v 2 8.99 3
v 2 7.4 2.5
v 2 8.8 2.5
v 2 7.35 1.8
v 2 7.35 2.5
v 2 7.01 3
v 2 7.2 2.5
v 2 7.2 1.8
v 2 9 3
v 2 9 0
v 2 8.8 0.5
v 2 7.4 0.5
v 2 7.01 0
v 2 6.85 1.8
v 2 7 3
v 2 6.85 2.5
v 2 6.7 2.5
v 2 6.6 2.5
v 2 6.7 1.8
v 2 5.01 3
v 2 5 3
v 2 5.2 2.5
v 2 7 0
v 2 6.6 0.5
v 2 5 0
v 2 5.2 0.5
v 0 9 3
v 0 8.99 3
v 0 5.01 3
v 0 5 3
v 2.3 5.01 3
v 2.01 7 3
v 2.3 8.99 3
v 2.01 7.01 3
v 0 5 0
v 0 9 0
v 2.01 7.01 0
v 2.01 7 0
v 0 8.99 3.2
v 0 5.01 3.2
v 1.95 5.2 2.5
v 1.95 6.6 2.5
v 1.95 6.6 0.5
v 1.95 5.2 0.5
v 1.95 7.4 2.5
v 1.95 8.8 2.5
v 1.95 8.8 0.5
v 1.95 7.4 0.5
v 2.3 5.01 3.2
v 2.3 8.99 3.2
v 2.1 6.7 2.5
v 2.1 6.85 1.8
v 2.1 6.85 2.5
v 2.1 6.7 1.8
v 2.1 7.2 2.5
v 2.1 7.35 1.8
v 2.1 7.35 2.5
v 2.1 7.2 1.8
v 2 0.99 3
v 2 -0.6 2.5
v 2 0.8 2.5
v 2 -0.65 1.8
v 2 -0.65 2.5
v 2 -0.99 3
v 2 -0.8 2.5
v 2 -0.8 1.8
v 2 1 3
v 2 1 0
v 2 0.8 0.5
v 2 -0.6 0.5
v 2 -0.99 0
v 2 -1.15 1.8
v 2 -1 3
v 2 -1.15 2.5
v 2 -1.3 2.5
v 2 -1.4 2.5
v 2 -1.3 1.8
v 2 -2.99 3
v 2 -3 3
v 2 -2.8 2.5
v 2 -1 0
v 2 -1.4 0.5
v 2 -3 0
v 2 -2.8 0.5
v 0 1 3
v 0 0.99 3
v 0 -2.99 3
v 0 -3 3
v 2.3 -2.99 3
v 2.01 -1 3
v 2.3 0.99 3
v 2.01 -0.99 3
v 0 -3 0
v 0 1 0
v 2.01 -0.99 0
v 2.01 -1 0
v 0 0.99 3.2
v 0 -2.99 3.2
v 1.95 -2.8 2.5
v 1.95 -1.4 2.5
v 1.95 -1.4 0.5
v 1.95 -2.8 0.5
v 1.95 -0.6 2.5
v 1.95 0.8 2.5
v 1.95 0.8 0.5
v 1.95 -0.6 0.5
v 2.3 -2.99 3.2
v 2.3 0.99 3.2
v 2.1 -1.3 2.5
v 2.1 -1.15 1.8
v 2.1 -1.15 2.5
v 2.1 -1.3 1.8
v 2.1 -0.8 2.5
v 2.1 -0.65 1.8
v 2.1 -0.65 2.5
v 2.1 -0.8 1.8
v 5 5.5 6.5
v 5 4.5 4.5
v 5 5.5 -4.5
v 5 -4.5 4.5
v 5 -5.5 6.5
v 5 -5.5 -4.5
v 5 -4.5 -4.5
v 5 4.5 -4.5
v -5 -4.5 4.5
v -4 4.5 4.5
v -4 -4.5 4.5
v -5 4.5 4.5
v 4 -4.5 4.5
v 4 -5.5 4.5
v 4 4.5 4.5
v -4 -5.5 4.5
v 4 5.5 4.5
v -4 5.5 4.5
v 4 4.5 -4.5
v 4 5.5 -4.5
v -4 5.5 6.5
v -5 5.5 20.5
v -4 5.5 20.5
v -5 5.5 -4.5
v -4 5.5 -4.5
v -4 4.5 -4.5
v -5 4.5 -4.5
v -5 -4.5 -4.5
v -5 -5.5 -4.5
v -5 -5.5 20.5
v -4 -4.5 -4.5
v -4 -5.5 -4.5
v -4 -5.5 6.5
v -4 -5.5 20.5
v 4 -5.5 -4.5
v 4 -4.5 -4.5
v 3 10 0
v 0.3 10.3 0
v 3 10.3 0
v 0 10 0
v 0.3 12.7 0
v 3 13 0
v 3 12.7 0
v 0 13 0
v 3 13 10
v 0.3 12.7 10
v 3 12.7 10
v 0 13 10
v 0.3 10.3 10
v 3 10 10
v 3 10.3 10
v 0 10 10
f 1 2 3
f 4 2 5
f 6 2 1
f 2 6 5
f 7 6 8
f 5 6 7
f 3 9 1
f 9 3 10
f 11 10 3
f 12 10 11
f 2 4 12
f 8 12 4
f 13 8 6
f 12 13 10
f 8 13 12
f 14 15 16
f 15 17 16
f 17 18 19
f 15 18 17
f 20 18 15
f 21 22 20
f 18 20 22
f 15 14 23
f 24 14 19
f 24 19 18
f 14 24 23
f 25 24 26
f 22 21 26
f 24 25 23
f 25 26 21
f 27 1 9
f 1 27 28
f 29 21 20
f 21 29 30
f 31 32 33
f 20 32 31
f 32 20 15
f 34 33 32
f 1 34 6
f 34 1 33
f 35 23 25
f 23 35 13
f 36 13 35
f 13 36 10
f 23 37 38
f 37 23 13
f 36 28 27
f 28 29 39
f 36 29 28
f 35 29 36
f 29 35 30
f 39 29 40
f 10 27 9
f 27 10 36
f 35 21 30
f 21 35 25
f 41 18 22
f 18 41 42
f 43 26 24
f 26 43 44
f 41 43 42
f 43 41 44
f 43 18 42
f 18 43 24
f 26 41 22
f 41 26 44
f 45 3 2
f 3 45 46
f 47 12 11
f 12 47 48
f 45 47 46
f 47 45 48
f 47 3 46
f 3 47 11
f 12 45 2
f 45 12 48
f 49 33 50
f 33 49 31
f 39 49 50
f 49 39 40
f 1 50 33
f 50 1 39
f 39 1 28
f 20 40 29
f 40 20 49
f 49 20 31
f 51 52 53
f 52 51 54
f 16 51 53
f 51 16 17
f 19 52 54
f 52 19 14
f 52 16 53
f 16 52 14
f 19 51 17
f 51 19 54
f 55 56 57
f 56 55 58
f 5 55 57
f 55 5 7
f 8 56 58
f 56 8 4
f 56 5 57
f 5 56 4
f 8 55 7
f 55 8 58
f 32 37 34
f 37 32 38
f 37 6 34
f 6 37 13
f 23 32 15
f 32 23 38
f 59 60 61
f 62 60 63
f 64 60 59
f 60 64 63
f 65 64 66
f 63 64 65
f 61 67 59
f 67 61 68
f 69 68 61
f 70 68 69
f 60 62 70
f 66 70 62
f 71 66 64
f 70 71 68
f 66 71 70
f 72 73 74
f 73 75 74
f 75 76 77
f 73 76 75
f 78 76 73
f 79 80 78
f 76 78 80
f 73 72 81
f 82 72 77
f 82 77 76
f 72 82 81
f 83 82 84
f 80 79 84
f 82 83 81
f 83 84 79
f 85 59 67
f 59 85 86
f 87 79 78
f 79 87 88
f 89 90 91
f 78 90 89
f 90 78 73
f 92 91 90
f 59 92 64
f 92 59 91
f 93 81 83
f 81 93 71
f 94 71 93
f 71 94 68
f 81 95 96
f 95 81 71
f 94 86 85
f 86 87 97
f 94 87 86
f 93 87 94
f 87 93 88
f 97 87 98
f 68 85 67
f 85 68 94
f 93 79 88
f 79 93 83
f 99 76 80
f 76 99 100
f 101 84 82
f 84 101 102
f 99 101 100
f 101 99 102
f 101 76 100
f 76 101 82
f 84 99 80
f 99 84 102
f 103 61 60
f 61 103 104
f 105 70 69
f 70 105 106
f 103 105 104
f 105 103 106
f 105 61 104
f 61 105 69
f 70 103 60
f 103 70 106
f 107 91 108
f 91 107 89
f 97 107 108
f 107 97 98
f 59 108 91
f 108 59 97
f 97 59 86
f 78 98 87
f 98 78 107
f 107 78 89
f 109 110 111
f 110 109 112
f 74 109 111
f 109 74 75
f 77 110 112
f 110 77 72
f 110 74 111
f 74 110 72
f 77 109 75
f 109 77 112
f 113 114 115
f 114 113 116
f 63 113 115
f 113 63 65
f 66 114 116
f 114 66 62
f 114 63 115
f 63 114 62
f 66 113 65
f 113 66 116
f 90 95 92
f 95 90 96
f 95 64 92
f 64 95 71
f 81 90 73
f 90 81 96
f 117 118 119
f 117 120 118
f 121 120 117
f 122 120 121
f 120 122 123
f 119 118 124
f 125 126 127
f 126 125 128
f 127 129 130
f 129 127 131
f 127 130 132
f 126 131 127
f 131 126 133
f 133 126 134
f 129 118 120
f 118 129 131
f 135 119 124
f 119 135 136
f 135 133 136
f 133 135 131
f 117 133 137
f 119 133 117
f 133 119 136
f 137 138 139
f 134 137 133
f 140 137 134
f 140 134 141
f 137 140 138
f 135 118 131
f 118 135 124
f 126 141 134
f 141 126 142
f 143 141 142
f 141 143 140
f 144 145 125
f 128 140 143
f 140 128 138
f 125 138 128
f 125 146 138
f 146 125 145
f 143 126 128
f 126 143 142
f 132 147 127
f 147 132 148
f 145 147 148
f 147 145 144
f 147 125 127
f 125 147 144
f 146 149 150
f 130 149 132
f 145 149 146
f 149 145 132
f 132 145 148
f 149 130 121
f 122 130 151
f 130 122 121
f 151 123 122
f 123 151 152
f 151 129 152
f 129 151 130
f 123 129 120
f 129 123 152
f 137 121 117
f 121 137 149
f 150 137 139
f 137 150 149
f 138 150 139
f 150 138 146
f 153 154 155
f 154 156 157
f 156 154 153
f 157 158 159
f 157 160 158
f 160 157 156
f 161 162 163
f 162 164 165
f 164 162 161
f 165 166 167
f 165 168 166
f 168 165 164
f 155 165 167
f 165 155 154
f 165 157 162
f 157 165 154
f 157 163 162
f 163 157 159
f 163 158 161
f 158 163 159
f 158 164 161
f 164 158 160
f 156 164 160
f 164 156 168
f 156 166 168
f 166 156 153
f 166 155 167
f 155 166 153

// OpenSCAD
// file: Asset_SCAD/Flange.scad
module Flange(){
color("#c0c6c7")
difference(){
cylinder(10,100,100,$fn=30);

r = 80;
for (i=[0:90:359]) {
    translate([r*cos(i),r*sin(i),-1])
        cylinder(12,10,10,$fn=30);
 
 translate([0,0,-1]) 
 cylinder(12,50,50,$fn=50);   
}

}

}

Flange();
// file: Asset_SCAD/Fireplace.scad
module Fireplace(){   
    translate([0,0,0.1])
    color("gray")
    cube([20,10,0.4], center= true);


    difference(){

    translate([0,0,0.2+5])
    color("#b65454")
    cube([16,6,10], center= true);


    translate([0,-2,4])
    color("#842020")
    cube([14,5,8], center= true);

    }


    translate([0,-1,0.4])
    color("#786565")
    cube([15,3,0.5], center= true);


    translate([0,0,10.5])
    color("gray")
    cube([18,8,1], center= true);

    translate([0,0,11.5])
    color("black")
    cube([20,10,1], center= true);


    translate([0,0,11.5])
    color("#b65454")
    linear_extrude(height = 8, scale = 0.8) 
    square([9,7], center = true);


    translate([0,0,19.5])
    color("#b65454")
    linear_extrude(height = 15, scale = 1) 
    square([9 *0.8,7 *0.8], center = true);

}

Fireplace();
// file: Asset_SCAD/Fence_02.scad
module Fence_02(){

    module staccionata(){
    color("#da6d42")
    cube([1,1,10],center = true);
    }

    for (i=[-8:8])
       translate([i*5,0,0])
          staccionata();
          
    color("#da6d42"){     
    translate([0,0,-2])      
    cube([83,0.5,1],center = true);}

    color("#da6d42"){  
    translate([0,0,2])
    cube([83,0.5,1],center = rue);
    }

    color("#bd9476"){
    for (i=[-17:17])

       translate([i*2.4,0.5,1])
       cube([2,0.5,12],center = true);
    }
    
}


Fence_02();
 

          
         
// file: Asset_SCAD/Fence_01.scad
module Fence_01(){

module staccionata(){
cube([1,1,10],center = true);

      
translate([0.5,0.5,5])
rotate([90,-90,0])
linear_extrude(height=1){
polygon([[0,0],[0,1],[1,0.5]], paths=[[0,1,2]]);
}

}

for (i=[-8:8])
   translate([i*5,0,0])
      staccionata();
    
translate([0,0,-2])      
cube([80,0.5,1],center = true);

translate([0,0,2])
cube([80,0.5,1],center = true);

}

color("#e6e0d4"){
Fence_01();
}
// file: Asset_SCAD/Eyebolt.scad
module Eyebolt(){

    module pieno(){
        cube([60,10,60], center =true);

        translate([0,0,30])
        rotate([90,0,0])
        cylinder(10,30,30,$fn=30,center=true);
    }

    color("#a8b0b2")
    difference(){

    pieno();

    translate([0,0,30])
    rotate([90,0,0])
    cylinder(12,15,15,$fn=30,center=true);
    }

}

Eyebolt();
// file: Asset_SCAD/Electric_Wire_Plug.scad
color("white")
translate([0,-1,0])
cylinder(1,1,1, center= true, $fn = 30);

color("white")
cube([2,2,1], center= true);

color("gray")
translate([0,1.8,0])
rotate([90,0,0])
cylinder(1.6,0.15,0.15, center= true, $fn = 30);

color("gray")
translate([0,2.6,0])
sphere(0.15, $fn = 30);



color("gray")
translate([0.6,2,0])
rotate([90,0,0])
cylinder(1.2,0.15,0.15, center= true, $fn = 30);

color("gray")
translate([0.6,2.6,0])
sphere(0.15, $fn = 30);

color("black")
translate([0.6,1.5,0])
rotate([90,0,0])
cylinder(1,0.18,0.18, center= true, $fn = 30);

color("black")
translate([-0.6,1.5,0])
rotate([90,0,0])
cylinder(1,0.18,0.18, center= true, $fn = 30);

color("gray")
translate([-0.6,2,0])
rotate([90,0,0])
cylinder(1.2,0.15,0.15, center= true, $fn = 30);

color("gray")
translate([-0.6,2.6,0])
sphere(0.15, $fn = 30);

color("white")
translate([0,-2,0])
rotate([90,0,0])
cylinder(1,0.4,0.4, center= true, $fn = 30);
// file: Asset_SCAD/Door.scad
module Door(){
        difference(){
            color("#664433")
            cube([8,1,14], center = true );

            color("#553311")
            translate([2,-1,-4])
            color("#664433")
            cube([2.5,1.5,4], center = true );

            color("#553311")
            translate([-2,-1,-4])
            color("#664433")
            cube([2.5,1.5,4], center = true );

            color("#553311")
            translate([-2,-1,3])
            color("#664433")
            cube([2.5,1.5,4], center = true );
             
            color("#553311"){
            translate([2,-1,3])
            color("#664433")
            cube([2.5,1.5,4], center = true );
            }

        }

    color("#664433")
    translate([2,-0.3,-4])
    cube([2.3,0.5,3.6], center = true);

    color("#664433")
    translate([-2,-0.3,-4])
    cube([2.3,0.5,3.6], center = true);

    color("#664433")
    translate([2,-0.3,3])
    cube([2.3,0.5,3.6], center = true);

    color("#664433")
    translate([-2,-0.3,3])
    cube([2.3,0.5,3.6], center = true);

    color("#ada192")
    translate([2,-0.85,-0.5])
    color("#664433")
    cube([2,0.2,0.2], center = true );
    color("#ada192")
    translate([2.75,-0.5,-0.5])
    color("#664433")
    cube([0.5,0.5,0.5], center = true );

}


Door();
// file: Asset_SCAD/Circular_Blade.scad
module Circular_Blade(){
    union(){
    color("#a8b0b2")
    cylinder(5,16,16,$fn=30,center= true);


    for (i=[0:45:359]) {
        r = 15; // pattern radius
        n = 10; // number of cars
    step = 360/n;
    for (i=[0:step:359]) {
        angle = i;
        dx = r*cos(angle);
        dy = r*sin(angle);
        translate([dx,dy,0])
        rotate([0,0,angle])
       
        {
        
    color("#99a3a3")    
    linear_extrude(7, scale = 1, center = true)
    polygon(points=[[0,0],[5,0],[2,3.7],[-2,3.7],[-5,0]]);
         
    }    
    }
    }


    }
}

Circular_Blade();
// file: Asset_SCAD/Chalkboard_Support.scad
union(){
color("#c87d3a")
cube([2,0.1,1],center =true);

color("#424e63")
cube([1.8,0.102,0.8],center =true);


color("#c87d3a"){
translate([1,0,-0.5]){
cube([0.1,0.1,0.8],center =true);
}


color("#c87d3a"){
translate([-1,0,-0.5]){
cube([0.1,0.1,0.8],center =true);
}


color("#c87d3a"){
translate([-1,0,-0.9]){
cube([0.1,0.8,0.1],center =true);
}
}

color("#c87d3a"){
translate([1,0,-0.9]){
cube([0.1,0.8,0.1],center =true);
}
}



}
}

}
// file: Asset_SCAD/Chalkboard.scad
union(){

color("#c87d3a")
cube([2,0.1,1],center =true);

color("#424e63")
cube([1.8,0.102,0.8],center =true);


translate([0,0.1,-0.48])
color("#8b8f2b")
cube([2,0.1,0.02],center =true);

translate([-0.6,0.1,-0.45])
color("white")
cube([0.15,0.02,0.02],center =true);
}
// file: Asset_SCAD/Chair_02.scad
// Angelo Nicolì 2023 - Licensed GPL-2.0

// Modify Input DATA to change the shape of the chair


// INPUT DATA

Table_Leg = [1,1,9];      // lenght, width and height of legs
Table_Top_Height = 2;     //  Height of theSeat

Leg_Distance_x = 12;        
Leg_Distance_y = 14;     

seat_height = 6;         // Backpost size 
seat_width = 1;           // Backpost width (x axis)


// OUTPUT DATA

translate([Leg_Distance_x*0.5,Leg_Distance_y*0.5,0])
color("#82490b")
cube([Table_Leg[0],Table_Leg[1],Table_Leg[2]],center=true);

translate([-Leg_Distance_x*0.5,Leg_Distance_y*0.5,0])
color("#82490b")
cube([Table_Leg[0],Table_Leg[1],Table_Leg[2]],center=true);

translate([-Leg_Distance_x*0.5,-Leg_Distance_y*0.5,0])
color("#82490b")
cube([Table_Leg[0],Table_Leg[1],Table_Leg[2]],center=true);

translate([Leg_Distance_x*0.5,-Leg_Distance_y*0.5,0])
color("#82490b")
cube([Table_Leg[0],Table_Leg[1],Table_Leg[2]],center=true);

Table_Upper = [Leg_Distance_x + Table_Leg[0],Leg_Distance_y +Table_Leg[1],Table_Top_Height];

seat = [seat_width,Leg_Distance_y+Table_Leg[1],seat_height];

translate([0,0,Table_Leg[2]*0.5+Table_Top_Height*0.5])
color("#82490b")
cube([Table_Upper[0],Table_Upper[1],Table_Upper[2]],center=true);

translate([-Table_Upper[0]*0.5+seat[0]*0.5,0,Table_Leg[2]*0.5+Table_Top_Height+seat_height*0.5])
color("#82490b")
cube([seat[0],seat[1],seat[2]],center=true);

rotate([0,0,90])
translate([7,0,-2])
color("#82490b")
cube([1,12,1],center=true);


rotate([0,0,90])
translate([-7,0,-2])
color("#82490b")
cube([1,12,1],center=true);


rotate([0,0,0])
translate([-6,0,-2])
color("#82490b")
cube([1,14,1],center=true);

rotate([0,0,90])
translate([7,0,9])
color("#82490b")
cube([1,12,1],center=true);

rotate([90,0,0])
translate([6,7.5,-7])
color("#82490b")
cube([1,4,1],center=true);

rotate([0,0,90])
translate([-7,0,9])
color("#82490b")
cube([1,12,1],center=true);

rotate([90,0,0])
translate([6,7.5,7])
color("#82490b")
cube([1,4,1],center=true);


translate([0,0,7])
color("#F4FFFF")
cube([12,12.7,2],center=true);

translate([-4.3,0,13])
rotate([0,90,0])
color("#F4FFFF")
cube([12,12.5,2.5],center=true);
// file: Asset_SCAD/Chair_01.scad
// Angelo Nicolì 2023 - Licensed GPL-2.0

// Modify Input DATA to change the shape of the chair




module Chair_01(){
    // INPUT DATA

    Table_Leg = [1,1,9];      // lenght, width and height of legs
    Table_Top_Height = 2;     //  Height of theSeat

    Leg_Distance_x = 9;        
    Leg_Distance_y = 10;     

    seat_height = 14;         // Backpost size 
    seat_width = 1;           // Backpost width (x axis)


    // OUTPUT DATA

    translate([Leg_Distance_x*0.5,Leg_Distance_y*0.5,0])
    color("PowderBlue")
    cube([Table_Leg[0],Table_Leg[1],Table_Leg[2]],center=true);

    translate([-Leg_Distance_x*0.5,Leg_Distance_y*0.5,0])
    color("PowderBlue")
    cube([Table_Leg[0],Table_Leg[1],Table_Leg[2]],center=true);

    translate([-Leg_Distance_x*0.5,-Leg_Distance_y*0.5,0])
    color("PowderBlue")
    cube([Table_Leg[0],Table_Leg[1],Table_Leg[2]],center=true);

    translate([Leg_Distance_x*0.5,-Leg_Distance_y*0.5,0])
    color("PowderBlue")
    cube([Table_Leg[0],Table_Leg[1],Table_Leg[2]],center=true);

    Table_Upper = [Leg_Distance_x + Table_Leg[0],Leg_Distance_y +Table_Leg[1],Table_Top_Height];

    seat = [seat_width,Leg_Distance_y+Table_Leg[1],seat_height];

    translate([0,0,Table_Leg[2]*0.5+Table_Top_Height*0.5])
    color("PowderBlue")
    cube([Table_Upper[0],Table_Upper[1],Table_Upper[2]],center=true);

    translate([-Table_Upper[0]*0.5+seat[0]*0.5,0,Table_Leg[2]*0.5+Table_Top_Height+seat_height*0.5])
    color("YellowGreen")
    cube([seat[0],seat[1],seat[2]],center=true);

}

Chair_01();
// file: Asset_SCAD/Building_02.scad
module Building_02() {
 
    module door(door_size =[10,10,10] , coord =[0,0,0]){
      color("#a59f8b")
      translate([coord[0],coord[1],coord[2]])
      cube([door_size[0],door_size[1],door_size[2]], center= true);
    }
    
    
    union(){
    color("#132919")
    cube([10,10,10],center=true);
    
    
    translate([0,0,5.5])
    color("#d1c093")
    cube([10,10,0.1],center=true);
    
    // Doors
    color("#a59f8b")
    translate([0,-5,-4])
    cube([2,0.1,3],center=true);
    
    
    // Windows
    translate([3,-5,-3]){
    color("#9fcbd0")
    cube([2,0.1,2],center=true);
    }
    
    translate([3,-5,3]){
    color("#9fcbd0")
    cube([2,0.1,2],center=true);
    }
    
    translate([-3,-5,-3]){
    color("#9fcbd0")
    cube([2,0.1,2],center=true);
    }
    
    translate([-3,-5,3]){
    color("#9fcbd0")
    cube([2,0.1,2],center=true);
    }
     
    // Roof
    translate([0,0,5])
    color("#a59f8b")
    cube([12,12,1],center=true);
    
    translate([0,0,-5]){
    color("#a59f8b")
    cube([12,12,1],center=true);
    }
    
    translate([0,0,0]){
    color("#a59f8b")
    cube([12,12,1],center=true);
    }
    
    }
}

Building_02();
// file: Asset_SCAD/Building_01.scad
module Building_01(){

    union(){
        color("#132919")
        cube([10,10,20],center=true);

        translate([0,0,10.5])
        color("#a59f8b")
        cube([10.5,10.5,1],center=true);

        translate([0,0,11])
        color("#d1c093")
        cube([10,10,0.1],center=true);

        color("#a59f8b")
        translate([0,-5,-9])
        cube([2,0.1,2],center=true);

        translate([0,0,5])
        color("#9fcbd0")
        cube([11,11,4],center=true);

        translate([0,0,-5]){
        color("#9fcbd0")
        cube([11,11,4],center=true);
        }

        translate([0,0,0]){
        color("#9fcbd0")
        cube([11,11,4],center=true);
        }

    }

}

Building_01();
// file: Asset_SCAD/Bricks.scad
// get a single number


module Bricks(){
colors = ["#cb6b6b","#dd7d7d","#9e3333","#842020"];



single_rand = rands(5,10,1)[0];
single_rand2 = rands(5,10,1)[0];

index_color = rands(0,3,1)[0];

color(colors[index_color])
linear_extrude(height = 3){
square([single_rand,single_rand2]);
}


}


Bricks();

translate([10,0,0])
Bricks();
// file: Asset_SCAD/Bookshelf_02.scad
module Bookshelf_02(){

difference(){
color("#bd9476")
cube([10,20,20],center=true);

color("#d5b07c")
translate([2,0,0])
cube([8,16,17],center=true);



}

color("#4f200f")
translate([0.5,0,5])
cube([8,16,0.6],center=true);


color("#4f200f")
translate([0.5,0,-0])
cube([8,16,0.6],center=true);

color("#4f200f")
translate([0.5,0,-5])
cube([8,16,0.6],center=true);


color("#4f200f")
translate([0,0,10.5])
cube([12,21,1],center=true);
}

 Bookshelf_02();
// file: Asset_SCAD/Bookshelf_01.scad
module Bookshelf_01(){
    difference(){
        color("#664433")
        cube([10,10,20],center=true);

        color("#ada192"){
        translate([2,0,5])
        cube([8,8,4],center=true);

        translate([2,0,-5])
        cube([8,8,4],center=true);


        translate([2,0,0])
        cube([8,8,4],center=true);

        translate([2,0,-5])
        cube([8,8,4],center=true);
        }
    }
}


Bookshelf_01();
// file: Asset_SCAD/Bench_02.scad
// #linear_extrude(7, scale = 1, center = true)


color("gray")
translate([0,-7,0])
rotate([90,0,0])
linear_extrude(1, scale = 1, center = true)
polygon(points=[[0,-4],[7,-4],[7,2],[0,2]]);
     
     
translate([0,7,0])    
color("gray")

rotate([90,0,0])
linear_extrude(1, scale = 1, center = true)
polygon(points=[[0,-4],[7,-4],[7,2],[0,2]]);   

color("#c69874"){
translate([1.5,0,1.3]) 
cube([1.5,13,1], center = true);

translate([3.5,0,1.3]) 
cube([1.5,13,1], center = true);

translate([5.5,0,1.3]) 
cube([1.5,13,1], center = true);


}
// file: Asset_SCAD/Bench_01.scad
// #linear_extrude(7, scale = 1, center = true)


color("gray")
translate([0,-7,0])
rotate([90,0,0])
linear_extrude(1, scale = 1, center = true)
polygon(points=[[0,-4],[7,-4],[7,2.2],[2,2],[1.8,6],[0,6]]);
     
     
translate([0,7,0])    
color("gray")
rotate([90,0,0])
linear_extrude(1, scale = 1, center = true)
polygon(points=[[0,-4],[7,-4],[7,2.2],[2,2],[1.8,6],[0,6]]);     

color("#c69874"){
translate([1.5,0,0]) 
cube([1.5,13,1], center = true);

translate([3.5,0,0]) 
cube([1.5,13,1], center = true);

translate([5.5,0,0]) 
cube([1.5,13,1], center = true);


translate([1,0,3]) 
cube([1,13,1.5], center = true);

translate([1,0,5]) 
cube([1,13,1.5], center = true);
}
// file: Asset_SCAD/Bed.scad
color("#badbed")
cube([1.86,1,0.3], center = true);

color("#cdaa7d"){
translate([0,0,-0.1])
cube([2.1,1.1,0.1], center = true);


translate([1,0.5,-0.2])
cube([0.1,0.1,0.2], center = true);

translate([-1,0.5,0.1])
cube([0.1,0.1,0.9], center = true);

translate([1,-0.5,-0.2])
cube([0.1,0.1,0.2], center = true);

translate([-1,-0.5,0.1])
cube([0.1,0.1,0.9], center = true);


translate([-1,0,0.4])
cube([0.1,0.9,0.1], center = true);
}

color("white"){
translate([-0.7,0,0.2])
cube([0.3,0.7,0.1], center = true);
}
// file: Asset_SCAD/Beam_C.scad
module Beam_C(){

    color("#CCCCCC"){
        linear_extrude(height = 10){
        polygon(points =[[0,0],[3,0],[3,0.3],[0.3,0.3],[0.3,2.7],[3,2.7],[3,3],[0,3]]);
            }
    }

}


Beam_C();
// file: Asset_SCAD/Base_cabinet_Wood.scad
module Base_cabinet_Wood(){

    translate([0,0.01,3])
    color("#8b6914")
    cube([2.3,3.98,0.2]);

    difference(){
    color("#cdaa7d")
    cube([2,4,3]);

    translate([1.95,0.2,0.5])
    color("#cdaa6f")
    cube([0.1,1.4,2]);

    translate([1.95 ,2.4,0.5])
    color("#cdaa6f")
    cube([0.1,1.4,2]);
    }

    translate([2,1.7,1.8])
    color("#8b6914")
    cube([0.1,0.15,0.7]);


    translate([2,2.2,1.8])
    color("#8b6914")
    cube([0.1,0.15,0.7]);


    translate([2,2,0])
    color("#000000")
    cube([0.01,0.01,3]);

}

Base_cabinet_Wood();
// file: Asset_SCAD/Base_cabinet_Gray.scad
module Base_cabinet_Gray(){

translate([0,0.01,3])
color("#c2c2c2")
cube([2.3,3.98,0.2]);

color("#9e9e9e")
cube([2,4,3]);

translate([2,1.5,0.8])
color("#c2c2c2")
cube([0.1,0.15,2]);


translate([2,2.5,0.8])
color("#c2c2c2")
cube([0.1,0.15,2]);


translate([2,2,0])
color("#000000")
cube([0.01,0.01,3]);

}

Base_cabinet_Gray();
// file: Asset_SCAD/Arc_02.scad
module Arc_01(){

color("#a8b0b2")


for (i=[0:45:359]) {
    r = 10; // pattern radius
    n = 19; // number of cars
step = 360/n;
for (i=[0:step:359]) {
    angle = i;
    dx = r*cos(angle);
    dy = r*sin(angle);
    //translate([dx,dy,0])
    rotate([0,0,angle])  
    {
 
  
// #linear_extrude(7, scale = 1, center = true) 
linear_extrude(7, scale = 1, center = true)
polygon(points=[[0,0],[25,-4],[25,4]]);
     
}    
 
}
}
}


color("#f2e8d7"){
difference(){
Arc_01();

translate([0,40,0])
cube([50,50,100], center = true);

translate([0,-15,0])
cube([60,50,100], center = true);


translate([48,0,0])
cube([60,50,100], center = true);


translate([-48,0,0])
cube([60,50,100], center = true);
}
}
// file: Asset_SCAD/Arc_01.scad
module Arc_01(){

module Arco(){

color("#a8b0b2")


for (i=[0:45:359]) {
    r = 10; // pattern radius
    n = 38; // number of cars
step = 360/n;
for (i=[0:step:359]) {
    angle = i;
    dx = r*cos(angle);
    dy = r*sin(angle);
    //translate([dx,dy,0])
    rotate([0,0,angle])  
    {
 
  
// #linear_extrude(7, scale = 1, center = true) 
linear_extrude(7, scale = 1, center = true)
polygon(points=[[0,0],[25,-2],[25,2]]);
     
}    
 
}
}
}

color("#f2e8d7"){
difference(){
Arco();

cylinder(50,20,20, center= true);

translate([0,-25,0])
cube([55,50,100], center = true);

}
}

}

Arc_01();
// main file
use <Asset_SCAD/Arc_01.scad>
use <Asset_SCAD/Arc_02.scad>
use <Asset_SCAD/Base_cabinet_Gray.scad>
use <Asset_SCAD/Base_cabinet_Gray.scad>
use <Asset_SCAD/Base_cabinet_Wood.scad>
use <Asset_SCAD/Beam_C.scad>
use <Asset_SCAD/Bed.scad>

use <Asset_SCAD/Bench_01.scad>
use <Asset_SCAD/Bench_02.scad>
use <Asset_SCAD/Bookshelf_01.scad>
use <Asset_SCAD/Bookshelf_02.scad>

use <Asset_SCAD/Bricks.scad>
use <Asset_SCAD/Building_01.scad>
use <Asset_SCAD/Building_02.scad>

use <Asset_SCAD/Chair_01.scad>
use <Asset_SCAD/Chair_02.scad>

use <Asset_SCAD/Chalkboard.scad>

use <Asset_SCAD/Chalkboard_Support.scad>
use <Asset_SCAD/Circular_Blade.scad>
use <Asset_SCAD/Door.scad>
use <Asset_SCAD/Electric_Wire_Plug.scad>
use <Asset_SCAD/Eyebolt.scad>
use <Asset_SCAD/Fence_01.scad>
use <Asset_SCAD/Fence_02.scad>
use <Asset_SCAD/Fireplace.scad>
use <Asset_SCAD/Flange.scad>






translate([0,5,0])
Base_cabinet_Wood();

translate([0,-3,0])
Base_cabinet_Wood();

translate([0,10,0])
Beam_C();

Chair_01();
